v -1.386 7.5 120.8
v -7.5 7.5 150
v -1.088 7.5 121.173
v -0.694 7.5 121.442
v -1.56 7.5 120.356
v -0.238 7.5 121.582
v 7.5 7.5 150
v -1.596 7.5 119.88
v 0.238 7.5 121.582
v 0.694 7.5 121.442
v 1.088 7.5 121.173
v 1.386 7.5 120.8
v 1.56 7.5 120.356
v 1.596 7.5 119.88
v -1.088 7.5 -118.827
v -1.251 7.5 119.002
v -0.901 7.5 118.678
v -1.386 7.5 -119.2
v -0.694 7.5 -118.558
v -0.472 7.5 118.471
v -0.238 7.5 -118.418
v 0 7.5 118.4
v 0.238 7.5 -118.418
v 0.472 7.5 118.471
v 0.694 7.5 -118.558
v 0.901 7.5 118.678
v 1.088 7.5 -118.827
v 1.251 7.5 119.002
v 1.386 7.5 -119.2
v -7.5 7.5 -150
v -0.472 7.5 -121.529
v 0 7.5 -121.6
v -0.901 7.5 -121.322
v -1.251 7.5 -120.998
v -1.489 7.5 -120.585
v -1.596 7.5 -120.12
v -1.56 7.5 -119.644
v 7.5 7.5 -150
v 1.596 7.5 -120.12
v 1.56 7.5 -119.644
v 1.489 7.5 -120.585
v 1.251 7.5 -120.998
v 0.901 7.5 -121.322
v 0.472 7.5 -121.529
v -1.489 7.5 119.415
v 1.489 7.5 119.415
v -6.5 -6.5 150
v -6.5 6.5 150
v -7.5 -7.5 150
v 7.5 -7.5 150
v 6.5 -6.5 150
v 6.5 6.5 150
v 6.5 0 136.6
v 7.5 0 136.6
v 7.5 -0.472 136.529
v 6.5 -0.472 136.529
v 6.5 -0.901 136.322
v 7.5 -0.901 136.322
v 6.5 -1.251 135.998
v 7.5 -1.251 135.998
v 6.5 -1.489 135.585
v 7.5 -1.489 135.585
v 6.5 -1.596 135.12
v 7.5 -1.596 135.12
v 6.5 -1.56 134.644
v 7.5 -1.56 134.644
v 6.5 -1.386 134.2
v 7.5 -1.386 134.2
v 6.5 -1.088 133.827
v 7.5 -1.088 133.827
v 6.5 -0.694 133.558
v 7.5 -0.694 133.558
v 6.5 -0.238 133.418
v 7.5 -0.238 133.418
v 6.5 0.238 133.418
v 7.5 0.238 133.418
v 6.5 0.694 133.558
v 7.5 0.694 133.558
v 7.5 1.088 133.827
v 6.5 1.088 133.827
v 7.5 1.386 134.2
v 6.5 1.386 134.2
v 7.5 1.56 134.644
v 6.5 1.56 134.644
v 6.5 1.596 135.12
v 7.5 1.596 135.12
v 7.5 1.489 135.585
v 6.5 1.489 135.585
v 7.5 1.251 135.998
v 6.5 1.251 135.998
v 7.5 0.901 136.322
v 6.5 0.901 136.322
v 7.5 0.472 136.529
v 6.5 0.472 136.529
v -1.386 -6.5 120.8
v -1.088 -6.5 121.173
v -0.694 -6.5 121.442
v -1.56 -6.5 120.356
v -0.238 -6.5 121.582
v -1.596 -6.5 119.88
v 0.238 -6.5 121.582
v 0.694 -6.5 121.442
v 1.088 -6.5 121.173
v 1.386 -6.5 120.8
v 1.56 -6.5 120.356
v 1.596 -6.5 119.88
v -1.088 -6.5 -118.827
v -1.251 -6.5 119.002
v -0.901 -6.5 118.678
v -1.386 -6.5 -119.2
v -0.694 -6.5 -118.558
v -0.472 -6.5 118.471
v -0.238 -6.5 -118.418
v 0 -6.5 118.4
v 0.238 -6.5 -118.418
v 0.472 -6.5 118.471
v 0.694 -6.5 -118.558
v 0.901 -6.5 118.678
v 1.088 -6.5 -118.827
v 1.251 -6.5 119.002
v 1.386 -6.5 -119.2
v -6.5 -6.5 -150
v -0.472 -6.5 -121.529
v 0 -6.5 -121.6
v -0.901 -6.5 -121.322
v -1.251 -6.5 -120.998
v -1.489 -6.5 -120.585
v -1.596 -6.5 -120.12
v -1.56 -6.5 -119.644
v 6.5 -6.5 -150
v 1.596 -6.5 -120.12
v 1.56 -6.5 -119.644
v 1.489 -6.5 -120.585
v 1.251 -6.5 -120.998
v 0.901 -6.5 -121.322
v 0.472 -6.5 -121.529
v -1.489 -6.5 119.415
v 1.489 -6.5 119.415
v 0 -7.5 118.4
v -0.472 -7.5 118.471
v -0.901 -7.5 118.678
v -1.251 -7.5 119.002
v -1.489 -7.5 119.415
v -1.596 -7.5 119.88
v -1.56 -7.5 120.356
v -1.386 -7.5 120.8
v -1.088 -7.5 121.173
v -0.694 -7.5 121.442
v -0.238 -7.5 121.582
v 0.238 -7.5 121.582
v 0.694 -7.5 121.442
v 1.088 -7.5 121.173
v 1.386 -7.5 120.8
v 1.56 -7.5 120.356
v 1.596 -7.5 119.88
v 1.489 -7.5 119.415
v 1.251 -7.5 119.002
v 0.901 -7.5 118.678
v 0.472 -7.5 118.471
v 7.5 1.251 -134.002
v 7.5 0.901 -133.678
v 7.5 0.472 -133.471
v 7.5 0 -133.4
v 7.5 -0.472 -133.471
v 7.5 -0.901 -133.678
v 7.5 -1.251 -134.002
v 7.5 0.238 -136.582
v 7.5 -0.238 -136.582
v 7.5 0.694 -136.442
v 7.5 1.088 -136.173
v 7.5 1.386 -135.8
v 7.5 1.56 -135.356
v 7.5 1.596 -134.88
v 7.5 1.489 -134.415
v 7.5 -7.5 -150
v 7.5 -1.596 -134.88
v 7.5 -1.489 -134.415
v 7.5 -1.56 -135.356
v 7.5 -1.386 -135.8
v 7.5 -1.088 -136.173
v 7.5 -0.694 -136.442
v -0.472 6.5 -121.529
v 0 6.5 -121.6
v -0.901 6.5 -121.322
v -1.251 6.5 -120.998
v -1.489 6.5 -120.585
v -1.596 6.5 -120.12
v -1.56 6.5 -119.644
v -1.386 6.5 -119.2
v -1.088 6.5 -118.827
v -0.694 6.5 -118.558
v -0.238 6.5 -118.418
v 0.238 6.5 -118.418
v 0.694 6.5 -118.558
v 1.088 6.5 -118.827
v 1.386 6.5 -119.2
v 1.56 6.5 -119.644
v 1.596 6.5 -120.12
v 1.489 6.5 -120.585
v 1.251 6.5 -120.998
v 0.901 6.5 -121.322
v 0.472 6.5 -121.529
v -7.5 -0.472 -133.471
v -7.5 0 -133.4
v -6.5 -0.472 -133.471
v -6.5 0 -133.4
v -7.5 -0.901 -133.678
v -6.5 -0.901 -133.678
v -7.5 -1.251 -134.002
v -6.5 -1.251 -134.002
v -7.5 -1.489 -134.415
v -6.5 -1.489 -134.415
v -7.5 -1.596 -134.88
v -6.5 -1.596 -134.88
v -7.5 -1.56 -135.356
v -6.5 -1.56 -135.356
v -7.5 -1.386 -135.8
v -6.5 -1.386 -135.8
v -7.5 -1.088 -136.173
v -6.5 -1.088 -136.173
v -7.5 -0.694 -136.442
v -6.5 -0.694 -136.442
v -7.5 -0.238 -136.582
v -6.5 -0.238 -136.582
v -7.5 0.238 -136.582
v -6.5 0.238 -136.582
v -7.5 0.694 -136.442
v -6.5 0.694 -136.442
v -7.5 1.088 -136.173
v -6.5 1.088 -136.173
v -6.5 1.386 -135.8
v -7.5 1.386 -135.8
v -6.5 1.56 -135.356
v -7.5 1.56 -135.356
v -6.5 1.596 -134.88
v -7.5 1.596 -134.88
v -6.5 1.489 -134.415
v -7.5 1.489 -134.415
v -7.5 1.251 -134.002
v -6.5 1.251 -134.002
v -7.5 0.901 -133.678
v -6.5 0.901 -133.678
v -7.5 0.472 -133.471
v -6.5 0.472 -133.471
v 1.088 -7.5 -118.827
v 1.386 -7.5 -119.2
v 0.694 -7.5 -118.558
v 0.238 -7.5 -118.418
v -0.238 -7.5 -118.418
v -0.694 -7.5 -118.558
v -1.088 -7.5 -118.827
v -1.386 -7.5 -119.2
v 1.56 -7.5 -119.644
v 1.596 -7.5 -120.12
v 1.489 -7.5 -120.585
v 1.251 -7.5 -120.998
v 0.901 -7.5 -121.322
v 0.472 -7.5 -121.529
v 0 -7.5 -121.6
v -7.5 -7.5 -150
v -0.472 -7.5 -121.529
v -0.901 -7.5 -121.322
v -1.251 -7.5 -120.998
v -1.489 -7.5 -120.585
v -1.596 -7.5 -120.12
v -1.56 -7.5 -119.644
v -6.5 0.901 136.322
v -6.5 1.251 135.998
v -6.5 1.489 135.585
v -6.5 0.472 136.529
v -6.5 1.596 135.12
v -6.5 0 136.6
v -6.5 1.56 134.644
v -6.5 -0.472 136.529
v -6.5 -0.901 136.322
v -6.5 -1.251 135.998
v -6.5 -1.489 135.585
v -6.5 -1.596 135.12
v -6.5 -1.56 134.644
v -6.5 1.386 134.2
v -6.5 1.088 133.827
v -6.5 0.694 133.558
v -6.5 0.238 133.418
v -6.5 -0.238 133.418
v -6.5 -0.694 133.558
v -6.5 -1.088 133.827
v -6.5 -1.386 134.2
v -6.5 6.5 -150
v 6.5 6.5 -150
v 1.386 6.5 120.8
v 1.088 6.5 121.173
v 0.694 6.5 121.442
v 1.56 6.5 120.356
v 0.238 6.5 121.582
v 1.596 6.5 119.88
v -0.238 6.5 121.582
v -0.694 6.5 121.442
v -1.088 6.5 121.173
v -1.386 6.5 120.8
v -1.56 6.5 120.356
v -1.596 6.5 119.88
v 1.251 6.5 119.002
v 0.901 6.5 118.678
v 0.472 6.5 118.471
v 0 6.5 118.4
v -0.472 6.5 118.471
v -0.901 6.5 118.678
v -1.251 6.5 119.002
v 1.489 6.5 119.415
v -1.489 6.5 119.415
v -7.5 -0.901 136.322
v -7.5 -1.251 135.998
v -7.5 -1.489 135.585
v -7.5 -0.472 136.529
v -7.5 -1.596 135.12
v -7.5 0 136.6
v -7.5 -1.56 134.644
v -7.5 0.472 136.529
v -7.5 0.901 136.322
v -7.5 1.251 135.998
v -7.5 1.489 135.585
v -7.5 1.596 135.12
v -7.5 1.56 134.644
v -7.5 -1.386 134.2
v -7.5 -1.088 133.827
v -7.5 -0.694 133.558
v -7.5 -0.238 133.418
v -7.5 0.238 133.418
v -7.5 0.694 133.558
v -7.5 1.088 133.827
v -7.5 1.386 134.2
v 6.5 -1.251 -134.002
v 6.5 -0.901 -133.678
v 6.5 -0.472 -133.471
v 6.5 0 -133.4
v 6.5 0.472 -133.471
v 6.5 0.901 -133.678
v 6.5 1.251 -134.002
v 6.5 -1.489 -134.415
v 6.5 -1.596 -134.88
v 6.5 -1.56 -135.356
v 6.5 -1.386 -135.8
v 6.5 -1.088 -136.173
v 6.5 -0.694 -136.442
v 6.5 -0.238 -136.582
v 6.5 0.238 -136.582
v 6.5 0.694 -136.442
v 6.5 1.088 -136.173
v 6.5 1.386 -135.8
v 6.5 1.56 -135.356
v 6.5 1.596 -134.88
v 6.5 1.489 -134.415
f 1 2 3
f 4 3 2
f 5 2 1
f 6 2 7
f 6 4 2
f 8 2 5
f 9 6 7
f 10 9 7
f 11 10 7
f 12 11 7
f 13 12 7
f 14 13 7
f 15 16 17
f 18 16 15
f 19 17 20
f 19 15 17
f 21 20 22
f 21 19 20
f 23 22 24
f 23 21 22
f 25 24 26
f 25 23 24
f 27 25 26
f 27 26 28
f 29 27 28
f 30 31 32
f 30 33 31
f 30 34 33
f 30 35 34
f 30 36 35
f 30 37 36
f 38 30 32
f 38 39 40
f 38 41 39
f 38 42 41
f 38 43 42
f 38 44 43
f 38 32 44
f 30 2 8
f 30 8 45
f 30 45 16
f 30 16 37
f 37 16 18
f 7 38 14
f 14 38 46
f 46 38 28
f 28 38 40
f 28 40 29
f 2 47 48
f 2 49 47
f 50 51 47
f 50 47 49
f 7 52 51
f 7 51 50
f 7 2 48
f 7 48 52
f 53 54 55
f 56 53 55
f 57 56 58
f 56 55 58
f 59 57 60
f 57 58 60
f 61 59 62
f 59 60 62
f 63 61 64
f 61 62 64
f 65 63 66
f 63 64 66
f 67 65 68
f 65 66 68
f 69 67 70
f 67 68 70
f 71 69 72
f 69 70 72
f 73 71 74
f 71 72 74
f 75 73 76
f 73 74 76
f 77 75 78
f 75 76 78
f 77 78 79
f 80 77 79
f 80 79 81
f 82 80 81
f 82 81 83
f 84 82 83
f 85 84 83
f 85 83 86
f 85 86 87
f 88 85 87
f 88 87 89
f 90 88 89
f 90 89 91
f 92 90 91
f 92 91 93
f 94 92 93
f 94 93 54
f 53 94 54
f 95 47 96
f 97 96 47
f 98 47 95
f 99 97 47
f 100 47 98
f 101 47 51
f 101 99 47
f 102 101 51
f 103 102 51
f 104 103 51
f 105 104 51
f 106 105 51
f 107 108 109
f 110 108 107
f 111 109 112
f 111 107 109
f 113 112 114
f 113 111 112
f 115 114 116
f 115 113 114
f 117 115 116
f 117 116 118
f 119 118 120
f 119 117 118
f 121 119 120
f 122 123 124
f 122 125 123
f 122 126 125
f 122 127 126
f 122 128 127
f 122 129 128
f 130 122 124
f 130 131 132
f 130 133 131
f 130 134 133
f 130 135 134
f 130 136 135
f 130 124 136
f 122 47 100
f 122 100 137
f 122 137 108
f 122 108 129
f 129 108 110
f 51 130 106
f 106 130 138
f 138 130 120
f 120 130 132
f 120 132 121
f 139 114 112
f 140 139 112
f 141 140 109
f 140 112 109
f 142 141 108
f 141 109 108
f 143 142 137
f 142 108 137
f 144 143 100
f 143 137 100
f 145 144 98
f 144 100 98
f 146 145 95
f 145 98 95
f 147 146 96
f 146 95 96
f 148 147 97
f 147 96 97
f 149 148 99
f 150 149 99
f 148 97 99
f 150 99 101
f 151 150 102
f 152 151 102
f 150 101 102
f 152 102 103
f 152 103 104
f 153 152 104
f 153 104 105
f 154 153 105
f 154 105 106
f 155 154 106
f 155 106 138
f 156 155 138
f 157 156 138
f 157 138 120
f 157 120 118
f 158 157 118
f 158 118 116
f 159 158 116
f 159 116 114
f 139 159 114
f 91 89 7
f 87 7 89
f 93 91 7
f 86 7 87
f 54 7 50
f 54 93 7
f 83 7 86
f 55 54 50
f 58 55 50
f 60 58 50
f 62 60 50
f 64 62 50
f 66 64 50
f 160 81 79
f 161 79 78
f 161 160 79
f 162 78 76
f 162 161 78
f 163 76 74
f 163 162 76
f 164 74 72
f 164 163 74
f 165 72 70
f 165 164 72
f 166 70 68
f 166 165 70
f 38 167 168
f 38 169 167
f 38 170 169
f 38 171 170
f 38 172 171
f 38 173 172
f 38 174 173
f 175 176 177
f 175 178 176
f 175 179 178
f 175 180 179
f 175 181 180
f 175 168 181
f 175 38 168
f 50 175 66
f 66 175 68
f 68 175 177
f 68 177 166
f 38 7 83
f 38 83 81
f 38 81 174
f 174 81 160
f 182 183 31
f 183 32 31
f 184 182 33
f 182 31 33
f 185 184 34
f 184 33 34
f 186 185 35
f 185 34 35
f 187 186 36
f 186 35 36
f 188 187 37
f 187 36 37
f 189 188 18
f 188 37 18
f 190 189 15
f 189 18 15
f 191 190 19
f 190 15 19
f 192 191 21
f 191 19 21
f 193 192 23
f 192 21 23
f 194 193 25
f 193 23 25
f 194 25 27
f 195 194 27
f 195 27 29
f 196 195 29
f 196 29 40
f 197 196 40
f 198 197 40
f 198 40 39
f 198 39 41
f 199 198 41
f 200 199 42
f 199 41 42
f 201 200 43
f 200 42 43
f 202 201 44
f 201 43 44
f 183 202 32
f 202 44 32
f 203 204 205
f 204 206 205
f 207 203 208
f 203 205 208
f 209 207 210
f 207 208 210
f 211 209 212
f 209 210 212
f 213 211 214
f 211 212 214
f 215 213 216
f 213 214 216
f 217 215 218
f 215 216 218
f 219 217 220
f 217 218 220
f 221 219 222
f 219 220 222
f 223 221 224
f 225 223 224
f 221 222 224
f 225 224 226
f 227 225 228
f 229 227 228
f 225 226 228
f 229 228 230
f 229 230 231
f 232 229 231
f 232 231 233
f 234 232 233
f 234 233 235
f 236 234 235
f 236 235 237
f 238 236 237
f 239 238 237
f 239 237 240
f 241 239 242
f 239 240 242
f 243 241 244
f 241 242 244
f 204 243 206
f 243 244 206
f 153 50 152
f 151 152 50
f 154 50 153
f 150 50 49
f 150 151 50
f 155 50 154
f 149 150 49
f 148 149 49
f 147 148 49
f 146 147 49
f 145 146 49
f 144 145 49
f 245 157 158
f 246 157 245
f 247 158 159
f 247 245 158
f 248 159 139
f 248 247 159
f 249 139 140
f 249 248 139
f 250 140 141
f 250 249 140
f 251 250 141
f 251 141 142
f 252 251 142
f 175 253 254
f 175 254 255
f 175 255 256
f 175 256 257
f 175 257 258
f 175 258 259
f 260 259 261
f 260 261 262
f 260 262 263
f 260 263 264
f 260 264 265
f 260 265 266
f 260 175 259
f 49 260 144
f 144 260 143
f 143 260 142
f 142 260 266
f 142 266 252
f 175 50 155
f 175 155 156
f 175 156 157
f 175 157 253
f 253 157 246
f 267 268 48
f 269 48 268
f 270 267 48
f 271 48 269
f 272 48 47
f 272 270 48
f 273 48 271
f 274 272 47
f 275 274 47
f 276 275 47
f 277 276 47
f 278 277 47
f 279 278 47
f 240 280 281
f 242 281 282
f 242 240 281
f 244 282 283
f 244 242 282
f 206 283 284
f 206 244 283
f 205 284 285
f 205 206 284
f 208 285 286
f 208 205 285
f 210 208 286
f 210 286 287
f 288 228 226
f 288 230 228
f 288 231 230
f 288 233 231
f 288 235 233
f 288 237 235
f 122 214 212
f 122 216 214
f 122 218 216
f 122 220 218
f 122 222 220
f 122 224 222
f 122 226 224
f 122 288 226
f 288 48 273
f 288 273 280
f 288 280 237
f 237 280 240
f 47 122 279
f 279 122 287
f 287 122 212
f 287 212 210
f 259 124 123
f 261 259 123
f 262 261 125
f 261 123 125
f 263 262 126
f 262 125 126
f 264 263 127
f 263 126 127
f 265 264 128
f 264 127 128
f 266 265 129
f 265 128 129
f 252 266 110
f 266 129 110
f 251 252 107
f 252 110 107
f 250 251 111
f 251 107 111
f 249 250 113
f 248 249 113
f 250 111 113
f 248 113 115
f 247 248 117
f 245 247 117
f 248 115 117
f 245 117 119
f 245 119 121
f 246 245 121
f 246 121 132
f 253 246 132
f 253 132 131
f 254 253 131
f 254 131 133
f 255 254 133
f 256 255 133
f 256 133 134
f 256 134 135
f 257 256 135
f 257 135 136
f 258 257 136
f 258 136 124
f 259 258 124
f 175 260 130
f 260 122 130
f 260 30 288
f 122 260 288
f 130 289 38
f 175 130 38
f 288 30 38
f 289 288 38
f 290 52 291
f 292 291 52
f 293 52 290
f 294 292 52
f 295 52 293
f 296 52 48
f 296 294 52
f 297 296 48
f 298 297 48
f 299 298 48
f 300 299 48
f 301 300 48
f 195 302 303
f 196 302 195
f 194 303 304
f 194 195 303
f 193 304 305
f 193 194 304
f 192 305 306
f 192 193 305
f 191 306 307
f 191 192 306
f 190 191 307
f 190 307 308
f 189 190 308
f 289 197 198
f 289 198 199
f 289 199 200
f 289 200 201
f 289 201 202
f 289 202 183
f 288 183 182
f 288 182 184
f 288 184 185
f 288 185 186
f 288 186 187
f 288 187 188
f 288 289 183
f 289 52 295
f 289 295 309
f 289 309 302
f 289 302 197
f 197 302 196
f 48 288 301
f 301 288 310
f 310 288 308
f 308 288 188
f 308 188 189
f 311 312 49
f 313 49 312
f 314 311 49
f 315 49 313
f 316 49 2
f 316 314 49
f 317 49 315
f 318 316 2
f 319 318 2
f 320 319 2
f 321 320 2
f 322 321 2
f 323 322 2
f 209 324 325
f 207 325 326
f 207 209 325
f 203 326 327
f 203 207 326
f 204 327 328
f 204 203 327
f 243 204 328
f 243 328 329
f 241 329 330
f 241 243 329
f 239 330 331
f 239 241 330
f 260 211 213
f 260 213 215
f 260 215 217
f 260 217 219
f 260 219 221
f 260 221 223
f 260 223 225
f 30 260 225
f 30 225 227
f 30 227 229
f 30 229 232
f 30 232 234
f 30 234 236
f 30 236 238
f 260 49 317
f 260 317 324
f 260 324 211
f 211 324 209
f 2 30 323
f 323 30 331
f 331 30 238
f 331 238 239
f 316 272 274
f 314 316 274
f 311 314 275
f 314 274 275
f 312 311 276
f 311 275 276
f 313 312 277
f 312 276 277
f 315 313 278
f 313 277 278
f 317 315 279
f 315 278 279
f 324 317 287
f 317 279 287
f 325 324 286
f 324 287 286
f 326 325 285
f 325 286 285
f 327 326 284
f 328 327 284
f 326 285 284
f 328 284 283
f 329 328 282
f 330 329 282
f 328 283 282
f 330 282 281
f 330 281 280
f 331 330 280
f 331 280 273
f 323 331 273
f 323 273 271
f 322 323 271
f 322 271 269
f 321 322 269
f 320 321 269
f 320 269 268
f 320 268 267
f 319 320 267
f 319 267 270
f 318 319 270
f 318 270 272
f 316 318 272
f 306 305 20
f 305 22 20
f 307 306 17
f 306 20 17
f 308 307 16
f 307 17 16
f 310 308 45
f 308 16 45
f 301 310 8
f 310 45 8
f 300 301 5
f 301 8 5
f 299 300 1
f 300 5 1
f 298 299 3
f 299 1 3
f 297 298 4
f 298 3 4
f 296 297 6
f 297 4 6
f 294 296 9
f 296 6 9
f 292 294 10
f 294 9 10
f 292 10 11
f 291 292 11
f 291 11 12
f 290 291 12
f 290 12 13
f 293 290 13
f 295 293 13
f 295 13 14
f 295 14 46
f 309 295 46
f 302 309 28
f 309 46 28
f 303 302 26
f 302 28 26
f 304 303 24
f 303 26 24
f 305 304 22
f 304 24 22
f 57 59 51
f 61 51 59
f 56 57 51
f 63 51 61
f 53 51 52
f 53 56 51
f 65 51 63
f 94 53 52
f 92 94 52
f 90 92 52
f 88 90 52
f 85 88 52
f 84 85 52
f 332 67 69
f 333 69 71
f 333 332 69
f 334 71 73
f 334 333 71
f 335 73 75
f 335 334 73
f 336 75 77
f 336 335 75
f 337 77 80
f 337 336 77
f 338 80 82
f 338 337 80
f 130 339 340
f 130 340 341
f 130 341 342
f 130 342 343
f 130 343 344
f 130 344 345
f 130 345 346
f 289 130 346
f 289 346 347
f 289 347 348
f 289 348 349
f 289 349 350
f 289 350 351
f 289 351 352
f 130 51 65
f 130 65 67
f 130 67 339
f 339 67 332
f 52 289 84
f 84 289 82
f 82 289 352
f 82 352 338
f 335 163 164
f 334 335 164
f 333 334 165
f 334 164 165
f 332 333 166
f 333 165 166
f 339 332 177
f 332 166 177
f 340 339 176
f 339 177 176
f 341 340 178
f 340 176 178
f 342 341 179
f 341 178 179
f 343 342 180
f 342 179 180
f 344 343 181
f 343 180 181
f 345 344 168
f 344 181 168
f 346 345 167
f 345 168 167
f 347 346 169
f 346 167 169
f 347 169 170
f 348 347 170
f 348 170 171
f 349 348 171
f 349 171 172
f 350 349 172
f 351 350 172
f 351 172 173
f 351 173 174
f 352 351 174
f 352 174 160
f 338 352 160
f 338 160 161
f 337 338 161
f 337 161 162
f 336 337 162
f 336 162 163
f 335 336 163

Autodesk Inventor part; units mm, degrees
ref_plane "YZ Plane" through (0, 0, 0) normal (1, 0, 0) x (0, 1, 0)
ref_plane "XZ Plane" through (0, 0, 0) normal (0, 1, 0) x (-1, 0, 0)
ref_plane "XY Plane" through (0, 0, 0) normal (0, 0, 1) x (1, 0, 0)
sketch "スケッチ1" plane through (0, 0, 0) normal (0, 0, 1) x (1, 0, 0)
  line L0 (-7.5, 7.5) -> (7.5, 7.5)
  line L1 (7.5, 7.5) -> (7.5, -7.5)
  line L2 (7.5, -7.5) -> (-7.5, -7.5)
  line L3 (-7.5, -7.5) -> (-7.5, 7.5)
  line L4 (-7.5, 7.5) -> (7.5, -7.5) construction
  line L5 (7.5, 7.5) -> (-7.5, -7.5) construction
  line L6 (-6.5, -6.5) -> (6.5, -6.5)
  line L7 (6.5, -6.5) -> (6.5, 6.5)
  line L8 (6.5, 6.5) -> (-6.5, 6.5)
  line L9 (-6.5, 6.5) -> (-6.5, -6.5)
  point P0 (0, 0)
  dimension "d0" = 15
  dimension "d1" = 15
extrude "押し出し1" add sketch "スケッチ1" along normal mid plane 300
sketch "スケッチ2" plane through (-7.5, -7.5, 150) normal (0, -1, 0) x (1, 0, 0)
  line L0 (7.5, -270) -> (7.5, -30)
  point P0 (7.5, -150)
  point P1 (7.5, -150)
  dimension "d4" = 240
hole "穴1" at (0, -7.5, 120) at (0, -7.5, -120) direction (0, 1, 0) diameter 3.2 end through all
sketch "スケッチ3" plane through (-7.5, -7.5, 150) normal (-1, 0, 0) x (0, 0, 1)
  line L0 (-285, 7.5) -> (-15, 7.5)
  point P0 (-150, 7.5)
  point P1 (-150, 7.5)
  dimension "d12" = 270
hole "穴2" at (-7.5, 0, -135) at (-7.5, 0, 135) direction (1, 0, 0) diameter 3.2 end through all
properties part number "回路角柱"
